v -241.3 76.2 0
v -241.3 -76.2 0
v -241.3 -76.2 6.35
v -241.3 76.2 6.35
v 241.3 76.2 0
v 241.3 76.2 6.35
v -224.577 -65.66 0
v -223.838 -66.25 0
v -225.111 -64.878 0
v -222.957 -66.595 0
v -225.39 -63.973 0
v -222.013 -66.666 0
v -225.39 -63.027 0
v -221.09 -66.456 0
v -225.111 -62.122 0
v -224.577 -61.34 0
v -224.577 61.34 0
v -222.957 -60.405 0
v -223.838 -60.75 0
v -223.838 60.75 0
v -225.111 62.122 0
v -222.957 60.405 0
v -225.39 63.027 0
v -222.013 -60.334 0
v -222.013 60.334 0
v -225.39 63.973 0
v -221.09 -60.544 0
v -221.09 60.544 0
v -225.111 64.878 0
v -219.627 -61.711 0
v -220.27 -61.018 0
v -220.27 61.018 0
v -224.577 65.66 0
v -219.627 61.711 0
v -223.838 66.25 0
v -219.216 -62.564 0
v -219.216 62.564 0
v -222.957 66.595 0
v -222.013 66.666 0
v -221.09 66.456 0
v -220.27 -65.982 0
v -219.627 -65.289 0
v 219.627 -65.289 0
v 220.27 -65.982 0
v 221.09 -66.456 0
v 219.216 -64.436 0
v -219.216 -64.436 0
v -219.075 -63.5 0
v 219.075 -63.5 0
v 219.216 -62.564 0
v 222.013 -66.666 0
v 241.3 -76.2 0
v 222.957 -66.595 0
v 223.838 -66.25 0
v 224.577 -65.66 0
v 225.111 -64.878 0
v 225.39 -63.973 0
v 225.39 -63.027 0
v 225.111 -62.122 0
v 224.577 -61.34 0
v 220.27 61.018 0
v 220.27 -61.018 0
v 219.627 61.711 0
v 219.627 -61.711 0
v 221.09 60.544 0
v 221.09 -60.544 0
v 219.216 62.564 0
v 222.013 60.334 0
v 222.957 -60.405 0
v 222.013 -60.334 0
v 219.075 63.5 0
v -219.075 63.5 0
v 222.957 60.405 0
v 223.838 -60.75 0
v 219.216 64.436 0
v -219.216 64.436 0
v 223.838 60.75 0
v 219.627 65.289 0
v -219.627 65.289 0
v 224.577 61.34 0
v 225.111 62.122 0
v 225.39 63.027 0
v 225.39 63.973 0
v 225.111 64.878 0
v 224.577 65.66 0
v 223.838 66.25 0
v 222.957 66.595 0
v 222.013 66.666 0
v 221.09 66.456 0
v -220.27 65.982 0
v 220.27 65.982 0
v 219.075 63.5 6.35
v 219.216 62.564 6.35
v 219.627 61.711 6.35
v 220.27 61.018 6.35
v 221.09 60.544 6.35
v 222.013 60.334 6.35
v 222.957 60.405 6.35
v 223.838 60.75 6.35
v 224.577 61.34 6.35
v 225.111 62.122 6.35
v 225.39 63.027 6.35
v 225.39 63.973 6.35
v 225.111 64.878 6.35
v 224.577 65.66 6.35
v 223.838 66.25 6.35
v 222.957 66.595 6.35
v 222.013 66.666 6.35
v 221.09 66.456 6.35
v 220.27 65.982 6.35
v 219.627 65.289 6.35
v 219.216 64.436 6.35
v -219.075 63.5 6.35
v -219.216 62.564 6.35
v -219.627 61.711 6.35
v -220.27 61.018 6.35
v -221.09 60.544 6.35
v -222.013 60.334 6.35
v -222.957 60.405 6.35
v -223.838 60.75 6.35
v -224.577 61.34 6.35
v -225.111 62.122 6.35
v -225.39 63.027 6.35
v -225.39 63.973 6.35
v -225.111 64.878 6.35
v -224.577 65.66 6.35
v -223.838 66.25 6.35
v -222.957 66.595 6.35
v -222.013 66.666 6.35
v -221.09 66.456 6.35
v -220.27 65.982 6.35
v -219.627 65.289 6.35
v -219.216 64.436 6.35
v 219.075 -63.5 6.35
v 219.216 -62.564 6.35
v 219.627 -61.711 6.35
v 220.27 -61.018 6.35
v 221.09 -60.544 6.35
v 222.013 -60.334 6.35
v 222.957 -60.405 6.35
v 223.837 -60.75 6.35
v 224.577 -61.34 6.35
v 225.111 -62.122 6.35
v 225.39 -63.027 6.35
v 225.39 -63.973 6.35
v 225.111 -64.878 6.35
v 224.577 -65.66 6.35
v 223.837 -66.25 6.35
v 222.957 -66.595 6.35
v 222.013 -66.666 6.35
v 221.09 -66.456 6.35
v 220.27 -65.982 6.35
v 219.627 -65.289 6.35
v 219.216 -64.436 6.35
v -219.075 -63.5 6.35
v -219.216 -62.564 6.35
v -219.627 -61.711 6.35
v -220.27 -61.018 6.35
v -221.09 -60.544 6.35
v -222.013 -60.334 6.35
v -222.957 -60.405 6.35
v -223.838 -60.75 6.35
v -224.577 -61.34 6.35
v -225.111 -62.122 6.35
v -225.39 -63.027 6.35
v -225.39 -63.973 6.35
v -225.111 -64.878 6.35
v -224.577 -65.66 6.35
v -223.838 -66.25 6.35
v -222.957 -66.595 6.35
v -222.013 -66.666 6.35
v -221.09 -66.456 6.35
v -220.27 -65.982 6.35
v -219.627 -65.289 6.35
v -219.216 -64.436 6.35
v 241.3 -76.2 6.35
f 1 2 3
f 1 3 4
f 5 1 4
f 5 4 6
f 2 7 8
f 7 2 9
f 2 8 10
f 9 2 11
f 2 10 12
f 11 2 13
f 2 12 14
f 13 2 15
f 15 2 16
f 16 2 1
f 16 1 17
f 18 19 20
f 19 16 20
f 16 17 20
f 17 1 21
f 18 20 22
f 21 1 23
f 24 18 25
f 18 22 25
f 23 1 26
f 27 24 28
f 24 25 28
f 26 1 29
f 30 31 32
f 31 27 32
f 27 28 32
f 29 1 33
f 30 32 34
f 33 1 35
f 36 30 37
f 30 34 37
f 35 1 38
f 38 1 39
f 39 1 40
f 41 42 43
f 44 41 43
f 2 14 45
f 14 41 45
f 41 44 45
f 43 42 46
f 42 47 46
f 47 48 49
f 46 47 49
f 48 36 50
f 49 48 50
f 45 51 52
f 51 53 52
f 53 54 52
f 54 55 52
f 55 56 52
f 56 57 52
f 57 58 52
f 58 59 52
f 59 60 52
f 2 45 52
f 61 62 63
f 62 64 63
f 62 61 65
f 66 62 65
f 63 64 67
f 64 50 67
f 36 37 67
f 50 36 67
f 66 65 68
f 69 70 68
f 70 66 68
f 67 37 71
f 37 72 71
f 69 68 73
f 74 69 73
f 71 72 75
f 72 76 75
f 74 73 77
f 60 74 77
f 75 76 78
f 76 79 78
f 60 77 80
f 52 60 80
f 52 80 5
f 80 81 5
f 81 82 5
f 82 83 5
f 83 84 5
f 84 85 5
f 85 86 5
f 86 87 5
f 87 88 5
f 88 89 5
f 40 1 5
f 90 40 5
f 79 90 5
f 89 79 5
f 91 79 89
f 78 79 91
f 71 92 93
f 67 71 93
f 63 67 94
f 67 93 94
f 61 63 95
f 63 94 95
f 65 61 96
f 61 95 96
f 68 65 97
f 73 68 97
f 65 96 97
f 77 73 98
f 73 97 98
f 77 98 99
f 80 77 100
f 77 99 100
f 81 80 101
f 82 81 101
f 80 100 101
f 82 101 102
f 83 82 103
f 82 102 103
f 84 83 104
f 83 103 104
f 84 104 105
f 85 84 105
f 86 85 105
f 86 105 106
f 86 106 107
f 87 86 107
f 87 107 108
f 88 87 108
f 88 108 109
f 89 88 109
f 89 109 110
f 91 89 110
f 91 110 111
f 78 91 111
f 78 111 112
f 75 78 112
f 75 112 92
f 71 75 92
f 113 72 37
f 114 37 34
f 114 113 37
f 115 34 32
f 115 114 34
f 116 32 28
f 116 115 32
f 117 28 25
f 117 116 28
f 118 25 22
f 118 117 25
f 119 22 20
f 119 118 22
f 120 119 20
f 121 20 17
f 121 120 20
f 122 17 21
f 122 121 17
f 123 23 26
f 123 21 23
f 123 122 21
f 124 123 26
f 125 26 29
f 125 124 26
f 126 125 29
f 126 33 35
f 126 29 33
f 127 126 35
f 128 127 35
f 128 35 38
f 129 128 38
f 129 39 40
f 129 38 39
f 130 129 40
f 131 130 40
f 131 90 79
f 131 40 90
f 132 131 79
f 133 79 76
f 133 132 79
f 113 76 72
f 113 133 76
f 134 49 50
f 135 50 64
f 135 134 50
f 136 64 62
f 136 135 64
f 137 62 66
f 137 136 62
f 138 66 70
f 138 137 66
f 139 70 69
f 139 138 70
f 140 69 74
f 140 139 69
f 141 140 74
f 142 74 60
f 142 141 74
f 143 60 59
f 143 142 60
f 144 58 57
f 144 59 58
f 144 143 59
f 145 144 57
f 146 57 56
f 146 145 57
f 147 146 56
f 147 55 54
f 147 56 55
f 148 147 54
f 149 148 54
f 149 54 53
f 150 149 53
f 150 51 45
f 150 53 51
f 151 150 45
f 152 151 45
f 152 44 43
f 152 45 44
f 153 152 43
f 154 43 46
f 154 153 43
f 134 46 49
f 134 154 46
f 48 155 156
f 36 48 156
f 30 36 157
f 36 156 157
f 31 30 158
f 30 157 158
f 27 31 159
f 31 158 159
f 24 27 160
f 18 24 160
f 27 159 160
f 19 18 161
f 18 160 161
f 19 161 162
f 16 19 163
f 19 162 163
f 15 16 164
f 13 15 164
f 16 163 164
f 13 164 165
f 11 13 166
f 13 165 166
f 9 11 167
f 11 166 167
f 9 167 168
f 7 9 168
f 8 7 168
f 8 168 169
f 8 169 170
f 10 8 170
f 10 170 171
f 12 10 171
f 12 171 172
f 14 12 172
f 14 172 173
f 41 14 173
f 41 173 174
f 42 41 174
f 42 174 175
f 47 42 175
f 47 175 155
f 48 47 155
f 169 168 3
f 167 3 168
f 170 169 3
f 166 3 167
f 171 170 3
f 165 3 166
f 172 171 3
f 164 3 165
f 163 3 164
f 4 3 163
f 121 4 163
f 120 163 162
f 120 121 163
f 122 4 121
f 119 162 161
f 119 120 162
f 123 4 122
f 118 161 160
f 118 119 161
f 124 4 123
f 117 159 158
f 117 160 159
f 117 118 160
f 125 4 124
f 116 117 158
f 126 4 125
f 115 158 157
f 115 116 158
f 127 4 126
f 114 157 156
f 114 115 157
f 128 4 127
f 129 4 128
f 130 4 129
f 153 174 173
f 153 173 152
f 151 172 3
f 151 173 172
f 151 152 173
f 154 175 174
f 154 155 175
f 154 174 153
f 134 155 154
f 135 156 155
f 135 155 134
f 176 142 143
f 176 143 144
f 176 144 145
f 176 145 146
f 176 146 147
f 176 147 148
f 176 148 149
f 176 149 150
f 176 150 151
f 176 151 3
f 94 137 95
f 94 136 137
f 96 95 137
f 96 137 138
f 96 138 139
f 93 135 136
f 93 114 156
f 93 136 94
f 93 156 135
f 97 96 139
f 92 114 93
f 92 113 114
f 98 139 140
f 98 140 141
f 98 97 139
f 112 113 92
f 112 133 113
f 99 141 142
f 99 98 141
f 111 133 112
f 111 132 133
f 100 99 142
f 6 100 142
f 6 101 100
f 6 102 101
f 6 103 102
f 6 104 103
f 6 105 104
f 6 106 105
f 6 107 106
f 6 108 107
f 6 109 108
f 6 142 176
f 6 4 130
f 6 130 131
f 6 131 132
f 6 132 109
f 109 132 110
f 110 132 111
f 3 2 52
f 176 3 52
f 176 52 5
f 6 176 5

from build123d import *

# Parameters (mm, degrees)
SKETCH1_W                                  = 482.6
SKETCH1_H                                  = 152.4
BOSS_EXTRUDE1_DEPTH                        = 6.35
SKETCH2_R                                  = 3.175
CUT_EXTRUDE1_DEPTH                         = 254.125369136
MIRROR1_AT_THE_SECOND_PLANE_COPY_1_SKETC_R = 3.175
MIRROR1_AT_THE_SECOND_PLANE_COPY_1_DEPTH   = 254.125369136


with BuildPart() as part:
    # Sketch1 → Boss-Extrude1 (new body)
    with BuildSketch(Plane.XY):
        Rectangle(SKETCH1_W, SKETCH1_H)
    extrude(amount=BOSS_EXTRUDE1_DEPTH)

    # Sketch2 → Cut-Extrude1 (cut, through all)
    with BuildSketch(Plane.XY.offset(6.35)):
        with Locations((-222.25, -63.5)):
            Circle(SKETCH2_R)
    cut_extrude1 = extrude(amount=-CUT_EXTRUDE1_DEPTH, mode=Mode.SUBTRACT)

    # Mirror1: Cut-Extrude1 across plane
    add(cut_extrude1.mirror(Plane(origin=(0, 0, 0), x_dir=(0, 0, 1), z_dir=(1, 0, 0))), mode=Mode.SUBTRACT)

    # Mirror1 at the second plane: Cut-Extrude1 across plane
    add(cut_extrude1.mirror(Plane.ZX), mode=Mode.SUBTRACT)

    # Mirror1 at the second plane copy 1 sketc → Mirror1 at the second plane copy 1 (cut, through all)
    with BuildSketch(Plane(origin=(0, 0, 6.35), x_dir=(-1, 0, 0), z_dir=(0, 0, 1))):
        with Locations((-222.25, -63.5)):
            Circle(MIRROR1_AT_THE_SECOND_PLANE_COPY_1_SKETC_R)
    extrude(amount=-MIRROR1_AT_THE_SECOND_PLANE_COPY_1_DEPTH, mode=Mode.SUBTRACT)


solid = part.part
